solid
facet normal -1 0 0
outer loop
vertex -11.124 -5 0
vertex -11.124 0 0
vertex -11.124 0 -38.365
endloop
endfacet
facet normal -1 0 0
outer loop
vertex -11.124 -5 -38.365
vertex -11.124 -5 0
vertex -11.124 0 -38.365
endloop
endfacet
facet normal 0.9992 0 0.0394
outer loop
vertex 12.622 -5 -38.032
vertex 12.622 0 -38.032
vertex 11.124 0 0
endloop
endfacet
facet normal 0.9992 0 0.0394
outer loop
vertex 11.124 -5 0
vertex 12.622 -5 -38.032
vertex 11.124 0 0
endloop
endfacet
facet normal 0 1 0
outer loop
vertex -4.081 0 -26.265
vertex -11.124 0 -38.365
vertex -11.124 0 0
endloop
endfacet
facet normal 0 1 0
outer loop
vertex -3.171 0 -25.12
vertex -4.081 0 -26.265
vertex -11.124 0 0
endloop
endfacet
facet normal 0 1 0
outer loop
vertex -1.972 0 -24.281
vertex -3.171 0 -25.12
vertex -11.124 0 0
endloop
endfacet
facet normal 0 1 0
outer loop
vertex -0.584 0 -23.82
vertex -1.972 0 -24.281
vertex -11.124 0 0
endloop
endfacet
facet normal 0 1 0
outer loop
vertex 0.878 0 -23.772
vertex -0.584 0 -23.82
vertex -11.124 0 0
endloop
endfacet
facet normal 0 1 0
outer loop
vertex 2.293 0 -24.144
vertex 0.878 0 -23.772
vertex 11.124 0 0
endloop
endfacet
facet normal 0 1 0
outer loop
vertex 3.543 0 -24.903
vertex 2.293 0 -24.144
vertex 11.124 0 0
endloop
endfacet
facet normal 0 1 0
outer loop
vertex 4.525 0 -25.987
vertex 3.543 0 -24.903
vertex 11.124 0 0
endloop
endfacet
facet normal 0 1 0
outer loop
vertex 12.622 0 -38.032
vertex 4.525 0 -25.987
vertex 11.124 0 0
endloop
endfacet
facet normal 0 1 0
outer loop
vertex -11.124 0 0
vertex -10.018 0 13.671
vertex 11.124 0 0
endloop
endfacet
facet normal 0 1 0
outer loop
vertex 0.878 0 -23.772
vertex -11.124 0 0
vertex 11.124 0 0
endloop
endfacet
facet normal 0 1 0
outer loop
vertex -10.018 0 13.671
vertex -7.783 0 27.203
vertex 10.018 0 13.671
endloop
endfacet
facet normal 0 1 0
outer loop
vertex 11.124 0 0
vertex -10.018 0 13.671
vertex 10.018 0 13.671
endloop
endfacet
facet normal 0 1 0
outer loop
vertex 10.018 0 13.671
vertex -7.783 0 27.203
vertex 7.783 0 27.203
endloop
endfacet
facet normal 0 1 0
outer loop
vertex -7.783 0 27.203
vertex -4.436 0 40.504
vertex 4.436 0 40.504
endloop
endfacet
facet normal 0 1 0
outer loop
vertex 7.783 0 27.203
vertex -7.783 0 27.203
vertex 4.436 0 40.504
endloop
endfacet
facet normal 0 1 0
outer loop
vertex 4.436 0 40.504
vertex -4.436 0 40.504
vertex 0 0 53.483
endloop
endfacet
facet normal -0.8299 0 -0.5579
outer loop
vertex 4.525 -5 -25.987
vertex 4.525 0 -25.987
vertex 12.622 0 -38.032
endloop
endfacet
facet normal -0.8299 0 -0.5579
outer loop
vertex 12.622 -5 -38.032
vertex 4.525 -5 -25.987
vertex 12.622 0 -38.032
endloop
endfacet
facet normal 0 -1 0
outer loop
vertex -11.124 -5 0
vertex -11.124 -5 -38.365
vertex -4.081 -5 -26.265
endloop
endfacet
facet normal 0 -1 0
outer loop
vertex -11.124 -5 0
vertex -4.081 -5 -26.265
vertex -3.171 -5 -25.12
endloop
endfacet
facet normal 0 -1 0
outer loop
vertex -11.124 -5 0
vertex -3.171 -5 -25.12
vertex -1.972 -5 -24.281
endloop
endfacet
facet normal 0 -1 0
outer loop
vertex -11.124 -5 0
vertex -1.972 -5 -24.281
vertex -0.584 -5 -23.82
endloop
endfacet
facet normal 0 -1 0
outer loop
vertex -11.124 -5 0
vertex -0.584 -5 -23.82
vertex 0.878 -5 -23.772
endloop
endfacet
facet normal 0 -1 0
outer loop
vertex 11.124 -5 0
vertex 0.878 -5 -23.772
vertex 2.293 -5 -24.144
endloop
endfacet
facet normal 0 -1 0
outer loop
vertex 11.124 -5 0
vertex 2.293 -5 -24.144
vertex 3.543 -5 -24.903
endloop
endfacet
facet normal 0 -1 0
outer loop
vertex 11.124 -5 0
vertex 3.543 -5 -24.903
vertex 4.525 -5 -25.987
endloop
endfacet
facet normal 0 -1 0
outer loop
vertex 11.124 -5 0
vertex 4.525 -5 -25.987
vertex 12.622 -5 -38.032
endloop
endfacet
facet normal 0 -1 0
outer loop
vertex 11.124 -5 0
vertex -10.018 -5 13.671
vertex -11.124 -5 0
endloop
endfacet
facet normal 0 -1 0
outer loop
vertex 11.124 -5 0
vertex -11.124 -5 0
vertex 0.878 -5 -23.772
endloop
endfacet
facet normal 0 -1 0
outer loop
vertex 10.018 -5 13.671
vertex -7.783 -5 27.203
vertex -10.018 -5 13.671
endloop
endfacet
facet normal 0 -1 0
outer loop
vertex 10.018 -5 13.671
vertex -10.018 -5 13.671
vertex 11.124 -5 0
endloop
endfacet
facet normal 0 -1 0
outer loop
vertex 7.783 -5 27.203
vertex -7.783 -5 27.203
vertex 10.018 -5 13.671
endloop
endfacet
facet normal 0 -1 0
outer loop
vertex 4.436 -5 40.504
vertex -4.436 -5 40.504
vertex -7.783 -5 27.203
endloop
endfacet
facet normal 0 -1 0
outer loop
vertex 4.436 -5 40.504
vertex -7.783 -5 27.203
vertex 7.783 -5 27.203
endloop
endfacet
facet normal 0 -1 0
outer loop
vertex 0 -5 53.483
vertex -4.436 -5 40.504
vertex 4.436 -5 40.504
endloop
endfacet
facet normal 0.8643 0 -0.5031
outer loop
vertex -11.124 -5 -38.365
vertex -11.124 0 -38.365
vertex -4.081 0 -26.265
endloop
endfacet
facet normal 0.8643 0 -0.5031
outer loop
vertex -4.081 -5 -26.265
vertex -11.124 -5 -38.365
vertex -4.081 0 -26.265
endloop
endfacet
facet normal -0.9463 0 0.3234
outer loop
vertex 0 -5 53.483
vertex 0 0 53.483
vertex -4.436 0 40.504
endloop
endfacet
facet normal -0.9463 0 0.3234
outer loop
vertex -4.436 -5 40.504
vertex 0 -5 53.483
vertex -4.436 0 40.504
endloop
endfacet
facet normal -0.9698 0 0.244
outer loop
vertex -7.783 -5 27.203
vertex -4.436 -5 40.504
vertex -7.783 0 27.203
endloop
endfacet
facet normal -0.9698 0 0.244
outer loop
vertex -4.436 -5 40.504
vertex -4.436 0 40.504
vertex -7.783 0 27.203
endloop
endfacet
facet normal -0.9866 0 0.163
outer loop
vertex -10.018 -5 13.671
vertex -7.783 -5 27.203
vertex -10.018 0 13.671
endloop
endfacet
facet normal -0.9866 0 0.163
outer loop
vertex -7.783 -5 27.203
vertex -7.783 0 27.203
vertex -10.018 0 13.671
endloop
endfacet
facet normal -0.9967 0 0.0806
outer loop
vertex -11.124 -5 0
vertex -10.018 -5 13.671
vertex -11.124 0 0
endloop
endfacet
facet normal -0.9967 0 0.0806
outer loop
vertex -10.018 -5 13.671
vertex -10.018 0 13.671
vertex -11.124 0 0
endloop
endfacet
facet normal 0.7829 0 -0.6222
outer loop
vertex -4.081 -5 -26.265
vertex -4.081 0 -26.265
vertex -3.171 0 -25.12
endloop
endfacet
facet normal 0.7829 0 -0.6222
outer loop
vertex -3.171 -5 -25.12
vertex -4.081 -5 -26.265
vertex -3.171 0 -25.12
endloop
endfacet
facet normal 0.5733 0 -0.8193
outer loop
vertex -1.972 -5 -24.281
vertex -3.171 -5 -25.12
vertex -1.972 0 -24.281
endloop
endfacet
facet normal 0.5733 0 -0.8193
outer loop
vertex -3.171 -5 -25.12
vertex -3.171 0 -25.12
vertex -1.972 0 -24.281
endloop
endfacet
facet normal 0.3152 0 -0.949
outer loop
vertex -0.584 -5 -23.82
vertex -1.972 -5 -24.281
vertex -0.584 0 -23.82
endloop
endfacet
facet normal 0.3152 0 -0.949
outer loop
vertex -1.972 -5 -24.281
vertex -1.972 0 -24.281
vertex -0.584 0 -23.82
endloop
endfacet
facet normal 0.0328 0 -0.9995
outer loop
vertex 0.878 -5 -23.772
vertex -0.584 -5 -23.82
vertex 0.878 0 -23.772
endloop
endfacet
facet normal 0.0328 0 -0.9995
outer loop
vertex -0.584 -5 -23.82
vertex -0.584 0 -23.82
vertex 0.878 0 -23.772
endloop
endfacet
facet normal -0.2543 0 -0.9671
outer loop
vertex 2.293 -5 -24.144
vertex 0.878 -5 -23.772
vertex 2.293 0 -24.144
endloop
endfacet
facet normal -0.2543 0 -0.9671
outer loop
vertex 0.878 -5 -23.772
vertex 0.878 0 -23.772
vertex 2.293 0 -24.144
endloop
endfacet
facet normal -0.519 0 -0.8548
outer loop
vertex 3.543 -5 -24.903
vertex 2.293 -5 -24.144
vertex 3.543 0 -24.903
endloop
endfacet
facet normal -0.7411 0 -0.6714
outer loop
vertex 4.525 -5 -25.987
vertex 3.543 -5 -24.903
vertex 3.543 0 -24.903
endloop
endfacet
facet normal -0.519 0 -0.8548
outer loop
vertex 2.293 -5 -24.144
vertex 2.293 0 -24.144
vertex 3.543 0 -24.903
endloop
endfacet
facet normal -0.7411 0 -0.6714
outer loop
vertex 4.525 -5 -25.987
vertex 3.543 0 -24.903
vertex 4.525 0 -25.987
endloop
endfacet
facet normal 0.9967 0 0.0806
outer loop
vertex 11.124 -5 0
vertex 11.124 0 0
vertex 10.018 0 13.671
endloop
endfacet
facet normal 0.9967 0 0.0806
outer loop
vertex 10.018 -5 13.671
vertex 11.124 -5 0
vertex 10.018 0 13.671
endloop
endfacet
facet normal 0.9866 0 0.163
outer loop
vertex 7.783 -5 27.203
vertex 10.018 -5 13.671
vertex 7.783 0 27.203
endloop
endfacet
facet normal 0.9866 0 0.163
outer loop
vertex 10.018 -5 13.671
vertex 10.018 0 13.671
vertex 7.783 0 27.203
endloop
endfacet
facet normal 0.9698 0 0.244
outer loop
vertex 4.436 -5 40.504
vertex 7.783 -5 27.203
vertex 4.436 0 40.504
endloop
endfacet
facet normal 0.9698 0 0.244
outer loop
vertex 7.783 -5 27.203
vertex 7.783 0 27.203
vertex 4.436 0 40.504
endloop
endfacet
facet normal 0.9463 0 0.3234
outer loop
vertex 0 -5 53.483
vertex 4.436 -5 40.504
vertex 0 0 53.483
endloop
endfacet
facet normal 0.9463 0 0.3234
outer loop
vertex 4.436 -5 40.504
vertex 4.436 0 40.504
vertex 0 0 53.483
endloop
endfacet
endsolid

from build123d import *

# Parameters (mm, degrees)
F1_DEPTH = 5
F2_DEPTH = 5


with BuildPart() as f1:
    # F0 (on Front) → F1 (new body)
    with BuildSketch(Plane.XZ):
        with BuildLine():
            ThreePointArc((11.124385, 0), (7.783139, 27.203268), (0, 53.482622))
            ThreePointArc((0, 53.482622), (-7.783139, 27.203268), (-11.124385, 0))
            Line((-11.124385, 0), (11.124385, 0))
        make_face()
    extrude(amount=F1_DEPTH)

    # F0 (on Front) → F2 (join)
    with BuildSketch(Plane.XZ):
        with BuildLine():
            Line((11.124385, 0), (-11.124385, 0))
            Line((-11.124385, 0), (-11.124385, -38.364865))
            Line((-11.124385, -38.364865), (-4.081059, -26.264793))
            ThreePointArc((-4.081059, -26.264793), (0.14515, -23.743036), (4.52543, -25.986524))
            Line((4.52543, -25.986524), (12.621719, -38.031906))
            Line((12.621719, -38.031906), (11.124385, 0))
        make_face()
    extrude(amount=F2_DEPTH)


solid = f1.part
